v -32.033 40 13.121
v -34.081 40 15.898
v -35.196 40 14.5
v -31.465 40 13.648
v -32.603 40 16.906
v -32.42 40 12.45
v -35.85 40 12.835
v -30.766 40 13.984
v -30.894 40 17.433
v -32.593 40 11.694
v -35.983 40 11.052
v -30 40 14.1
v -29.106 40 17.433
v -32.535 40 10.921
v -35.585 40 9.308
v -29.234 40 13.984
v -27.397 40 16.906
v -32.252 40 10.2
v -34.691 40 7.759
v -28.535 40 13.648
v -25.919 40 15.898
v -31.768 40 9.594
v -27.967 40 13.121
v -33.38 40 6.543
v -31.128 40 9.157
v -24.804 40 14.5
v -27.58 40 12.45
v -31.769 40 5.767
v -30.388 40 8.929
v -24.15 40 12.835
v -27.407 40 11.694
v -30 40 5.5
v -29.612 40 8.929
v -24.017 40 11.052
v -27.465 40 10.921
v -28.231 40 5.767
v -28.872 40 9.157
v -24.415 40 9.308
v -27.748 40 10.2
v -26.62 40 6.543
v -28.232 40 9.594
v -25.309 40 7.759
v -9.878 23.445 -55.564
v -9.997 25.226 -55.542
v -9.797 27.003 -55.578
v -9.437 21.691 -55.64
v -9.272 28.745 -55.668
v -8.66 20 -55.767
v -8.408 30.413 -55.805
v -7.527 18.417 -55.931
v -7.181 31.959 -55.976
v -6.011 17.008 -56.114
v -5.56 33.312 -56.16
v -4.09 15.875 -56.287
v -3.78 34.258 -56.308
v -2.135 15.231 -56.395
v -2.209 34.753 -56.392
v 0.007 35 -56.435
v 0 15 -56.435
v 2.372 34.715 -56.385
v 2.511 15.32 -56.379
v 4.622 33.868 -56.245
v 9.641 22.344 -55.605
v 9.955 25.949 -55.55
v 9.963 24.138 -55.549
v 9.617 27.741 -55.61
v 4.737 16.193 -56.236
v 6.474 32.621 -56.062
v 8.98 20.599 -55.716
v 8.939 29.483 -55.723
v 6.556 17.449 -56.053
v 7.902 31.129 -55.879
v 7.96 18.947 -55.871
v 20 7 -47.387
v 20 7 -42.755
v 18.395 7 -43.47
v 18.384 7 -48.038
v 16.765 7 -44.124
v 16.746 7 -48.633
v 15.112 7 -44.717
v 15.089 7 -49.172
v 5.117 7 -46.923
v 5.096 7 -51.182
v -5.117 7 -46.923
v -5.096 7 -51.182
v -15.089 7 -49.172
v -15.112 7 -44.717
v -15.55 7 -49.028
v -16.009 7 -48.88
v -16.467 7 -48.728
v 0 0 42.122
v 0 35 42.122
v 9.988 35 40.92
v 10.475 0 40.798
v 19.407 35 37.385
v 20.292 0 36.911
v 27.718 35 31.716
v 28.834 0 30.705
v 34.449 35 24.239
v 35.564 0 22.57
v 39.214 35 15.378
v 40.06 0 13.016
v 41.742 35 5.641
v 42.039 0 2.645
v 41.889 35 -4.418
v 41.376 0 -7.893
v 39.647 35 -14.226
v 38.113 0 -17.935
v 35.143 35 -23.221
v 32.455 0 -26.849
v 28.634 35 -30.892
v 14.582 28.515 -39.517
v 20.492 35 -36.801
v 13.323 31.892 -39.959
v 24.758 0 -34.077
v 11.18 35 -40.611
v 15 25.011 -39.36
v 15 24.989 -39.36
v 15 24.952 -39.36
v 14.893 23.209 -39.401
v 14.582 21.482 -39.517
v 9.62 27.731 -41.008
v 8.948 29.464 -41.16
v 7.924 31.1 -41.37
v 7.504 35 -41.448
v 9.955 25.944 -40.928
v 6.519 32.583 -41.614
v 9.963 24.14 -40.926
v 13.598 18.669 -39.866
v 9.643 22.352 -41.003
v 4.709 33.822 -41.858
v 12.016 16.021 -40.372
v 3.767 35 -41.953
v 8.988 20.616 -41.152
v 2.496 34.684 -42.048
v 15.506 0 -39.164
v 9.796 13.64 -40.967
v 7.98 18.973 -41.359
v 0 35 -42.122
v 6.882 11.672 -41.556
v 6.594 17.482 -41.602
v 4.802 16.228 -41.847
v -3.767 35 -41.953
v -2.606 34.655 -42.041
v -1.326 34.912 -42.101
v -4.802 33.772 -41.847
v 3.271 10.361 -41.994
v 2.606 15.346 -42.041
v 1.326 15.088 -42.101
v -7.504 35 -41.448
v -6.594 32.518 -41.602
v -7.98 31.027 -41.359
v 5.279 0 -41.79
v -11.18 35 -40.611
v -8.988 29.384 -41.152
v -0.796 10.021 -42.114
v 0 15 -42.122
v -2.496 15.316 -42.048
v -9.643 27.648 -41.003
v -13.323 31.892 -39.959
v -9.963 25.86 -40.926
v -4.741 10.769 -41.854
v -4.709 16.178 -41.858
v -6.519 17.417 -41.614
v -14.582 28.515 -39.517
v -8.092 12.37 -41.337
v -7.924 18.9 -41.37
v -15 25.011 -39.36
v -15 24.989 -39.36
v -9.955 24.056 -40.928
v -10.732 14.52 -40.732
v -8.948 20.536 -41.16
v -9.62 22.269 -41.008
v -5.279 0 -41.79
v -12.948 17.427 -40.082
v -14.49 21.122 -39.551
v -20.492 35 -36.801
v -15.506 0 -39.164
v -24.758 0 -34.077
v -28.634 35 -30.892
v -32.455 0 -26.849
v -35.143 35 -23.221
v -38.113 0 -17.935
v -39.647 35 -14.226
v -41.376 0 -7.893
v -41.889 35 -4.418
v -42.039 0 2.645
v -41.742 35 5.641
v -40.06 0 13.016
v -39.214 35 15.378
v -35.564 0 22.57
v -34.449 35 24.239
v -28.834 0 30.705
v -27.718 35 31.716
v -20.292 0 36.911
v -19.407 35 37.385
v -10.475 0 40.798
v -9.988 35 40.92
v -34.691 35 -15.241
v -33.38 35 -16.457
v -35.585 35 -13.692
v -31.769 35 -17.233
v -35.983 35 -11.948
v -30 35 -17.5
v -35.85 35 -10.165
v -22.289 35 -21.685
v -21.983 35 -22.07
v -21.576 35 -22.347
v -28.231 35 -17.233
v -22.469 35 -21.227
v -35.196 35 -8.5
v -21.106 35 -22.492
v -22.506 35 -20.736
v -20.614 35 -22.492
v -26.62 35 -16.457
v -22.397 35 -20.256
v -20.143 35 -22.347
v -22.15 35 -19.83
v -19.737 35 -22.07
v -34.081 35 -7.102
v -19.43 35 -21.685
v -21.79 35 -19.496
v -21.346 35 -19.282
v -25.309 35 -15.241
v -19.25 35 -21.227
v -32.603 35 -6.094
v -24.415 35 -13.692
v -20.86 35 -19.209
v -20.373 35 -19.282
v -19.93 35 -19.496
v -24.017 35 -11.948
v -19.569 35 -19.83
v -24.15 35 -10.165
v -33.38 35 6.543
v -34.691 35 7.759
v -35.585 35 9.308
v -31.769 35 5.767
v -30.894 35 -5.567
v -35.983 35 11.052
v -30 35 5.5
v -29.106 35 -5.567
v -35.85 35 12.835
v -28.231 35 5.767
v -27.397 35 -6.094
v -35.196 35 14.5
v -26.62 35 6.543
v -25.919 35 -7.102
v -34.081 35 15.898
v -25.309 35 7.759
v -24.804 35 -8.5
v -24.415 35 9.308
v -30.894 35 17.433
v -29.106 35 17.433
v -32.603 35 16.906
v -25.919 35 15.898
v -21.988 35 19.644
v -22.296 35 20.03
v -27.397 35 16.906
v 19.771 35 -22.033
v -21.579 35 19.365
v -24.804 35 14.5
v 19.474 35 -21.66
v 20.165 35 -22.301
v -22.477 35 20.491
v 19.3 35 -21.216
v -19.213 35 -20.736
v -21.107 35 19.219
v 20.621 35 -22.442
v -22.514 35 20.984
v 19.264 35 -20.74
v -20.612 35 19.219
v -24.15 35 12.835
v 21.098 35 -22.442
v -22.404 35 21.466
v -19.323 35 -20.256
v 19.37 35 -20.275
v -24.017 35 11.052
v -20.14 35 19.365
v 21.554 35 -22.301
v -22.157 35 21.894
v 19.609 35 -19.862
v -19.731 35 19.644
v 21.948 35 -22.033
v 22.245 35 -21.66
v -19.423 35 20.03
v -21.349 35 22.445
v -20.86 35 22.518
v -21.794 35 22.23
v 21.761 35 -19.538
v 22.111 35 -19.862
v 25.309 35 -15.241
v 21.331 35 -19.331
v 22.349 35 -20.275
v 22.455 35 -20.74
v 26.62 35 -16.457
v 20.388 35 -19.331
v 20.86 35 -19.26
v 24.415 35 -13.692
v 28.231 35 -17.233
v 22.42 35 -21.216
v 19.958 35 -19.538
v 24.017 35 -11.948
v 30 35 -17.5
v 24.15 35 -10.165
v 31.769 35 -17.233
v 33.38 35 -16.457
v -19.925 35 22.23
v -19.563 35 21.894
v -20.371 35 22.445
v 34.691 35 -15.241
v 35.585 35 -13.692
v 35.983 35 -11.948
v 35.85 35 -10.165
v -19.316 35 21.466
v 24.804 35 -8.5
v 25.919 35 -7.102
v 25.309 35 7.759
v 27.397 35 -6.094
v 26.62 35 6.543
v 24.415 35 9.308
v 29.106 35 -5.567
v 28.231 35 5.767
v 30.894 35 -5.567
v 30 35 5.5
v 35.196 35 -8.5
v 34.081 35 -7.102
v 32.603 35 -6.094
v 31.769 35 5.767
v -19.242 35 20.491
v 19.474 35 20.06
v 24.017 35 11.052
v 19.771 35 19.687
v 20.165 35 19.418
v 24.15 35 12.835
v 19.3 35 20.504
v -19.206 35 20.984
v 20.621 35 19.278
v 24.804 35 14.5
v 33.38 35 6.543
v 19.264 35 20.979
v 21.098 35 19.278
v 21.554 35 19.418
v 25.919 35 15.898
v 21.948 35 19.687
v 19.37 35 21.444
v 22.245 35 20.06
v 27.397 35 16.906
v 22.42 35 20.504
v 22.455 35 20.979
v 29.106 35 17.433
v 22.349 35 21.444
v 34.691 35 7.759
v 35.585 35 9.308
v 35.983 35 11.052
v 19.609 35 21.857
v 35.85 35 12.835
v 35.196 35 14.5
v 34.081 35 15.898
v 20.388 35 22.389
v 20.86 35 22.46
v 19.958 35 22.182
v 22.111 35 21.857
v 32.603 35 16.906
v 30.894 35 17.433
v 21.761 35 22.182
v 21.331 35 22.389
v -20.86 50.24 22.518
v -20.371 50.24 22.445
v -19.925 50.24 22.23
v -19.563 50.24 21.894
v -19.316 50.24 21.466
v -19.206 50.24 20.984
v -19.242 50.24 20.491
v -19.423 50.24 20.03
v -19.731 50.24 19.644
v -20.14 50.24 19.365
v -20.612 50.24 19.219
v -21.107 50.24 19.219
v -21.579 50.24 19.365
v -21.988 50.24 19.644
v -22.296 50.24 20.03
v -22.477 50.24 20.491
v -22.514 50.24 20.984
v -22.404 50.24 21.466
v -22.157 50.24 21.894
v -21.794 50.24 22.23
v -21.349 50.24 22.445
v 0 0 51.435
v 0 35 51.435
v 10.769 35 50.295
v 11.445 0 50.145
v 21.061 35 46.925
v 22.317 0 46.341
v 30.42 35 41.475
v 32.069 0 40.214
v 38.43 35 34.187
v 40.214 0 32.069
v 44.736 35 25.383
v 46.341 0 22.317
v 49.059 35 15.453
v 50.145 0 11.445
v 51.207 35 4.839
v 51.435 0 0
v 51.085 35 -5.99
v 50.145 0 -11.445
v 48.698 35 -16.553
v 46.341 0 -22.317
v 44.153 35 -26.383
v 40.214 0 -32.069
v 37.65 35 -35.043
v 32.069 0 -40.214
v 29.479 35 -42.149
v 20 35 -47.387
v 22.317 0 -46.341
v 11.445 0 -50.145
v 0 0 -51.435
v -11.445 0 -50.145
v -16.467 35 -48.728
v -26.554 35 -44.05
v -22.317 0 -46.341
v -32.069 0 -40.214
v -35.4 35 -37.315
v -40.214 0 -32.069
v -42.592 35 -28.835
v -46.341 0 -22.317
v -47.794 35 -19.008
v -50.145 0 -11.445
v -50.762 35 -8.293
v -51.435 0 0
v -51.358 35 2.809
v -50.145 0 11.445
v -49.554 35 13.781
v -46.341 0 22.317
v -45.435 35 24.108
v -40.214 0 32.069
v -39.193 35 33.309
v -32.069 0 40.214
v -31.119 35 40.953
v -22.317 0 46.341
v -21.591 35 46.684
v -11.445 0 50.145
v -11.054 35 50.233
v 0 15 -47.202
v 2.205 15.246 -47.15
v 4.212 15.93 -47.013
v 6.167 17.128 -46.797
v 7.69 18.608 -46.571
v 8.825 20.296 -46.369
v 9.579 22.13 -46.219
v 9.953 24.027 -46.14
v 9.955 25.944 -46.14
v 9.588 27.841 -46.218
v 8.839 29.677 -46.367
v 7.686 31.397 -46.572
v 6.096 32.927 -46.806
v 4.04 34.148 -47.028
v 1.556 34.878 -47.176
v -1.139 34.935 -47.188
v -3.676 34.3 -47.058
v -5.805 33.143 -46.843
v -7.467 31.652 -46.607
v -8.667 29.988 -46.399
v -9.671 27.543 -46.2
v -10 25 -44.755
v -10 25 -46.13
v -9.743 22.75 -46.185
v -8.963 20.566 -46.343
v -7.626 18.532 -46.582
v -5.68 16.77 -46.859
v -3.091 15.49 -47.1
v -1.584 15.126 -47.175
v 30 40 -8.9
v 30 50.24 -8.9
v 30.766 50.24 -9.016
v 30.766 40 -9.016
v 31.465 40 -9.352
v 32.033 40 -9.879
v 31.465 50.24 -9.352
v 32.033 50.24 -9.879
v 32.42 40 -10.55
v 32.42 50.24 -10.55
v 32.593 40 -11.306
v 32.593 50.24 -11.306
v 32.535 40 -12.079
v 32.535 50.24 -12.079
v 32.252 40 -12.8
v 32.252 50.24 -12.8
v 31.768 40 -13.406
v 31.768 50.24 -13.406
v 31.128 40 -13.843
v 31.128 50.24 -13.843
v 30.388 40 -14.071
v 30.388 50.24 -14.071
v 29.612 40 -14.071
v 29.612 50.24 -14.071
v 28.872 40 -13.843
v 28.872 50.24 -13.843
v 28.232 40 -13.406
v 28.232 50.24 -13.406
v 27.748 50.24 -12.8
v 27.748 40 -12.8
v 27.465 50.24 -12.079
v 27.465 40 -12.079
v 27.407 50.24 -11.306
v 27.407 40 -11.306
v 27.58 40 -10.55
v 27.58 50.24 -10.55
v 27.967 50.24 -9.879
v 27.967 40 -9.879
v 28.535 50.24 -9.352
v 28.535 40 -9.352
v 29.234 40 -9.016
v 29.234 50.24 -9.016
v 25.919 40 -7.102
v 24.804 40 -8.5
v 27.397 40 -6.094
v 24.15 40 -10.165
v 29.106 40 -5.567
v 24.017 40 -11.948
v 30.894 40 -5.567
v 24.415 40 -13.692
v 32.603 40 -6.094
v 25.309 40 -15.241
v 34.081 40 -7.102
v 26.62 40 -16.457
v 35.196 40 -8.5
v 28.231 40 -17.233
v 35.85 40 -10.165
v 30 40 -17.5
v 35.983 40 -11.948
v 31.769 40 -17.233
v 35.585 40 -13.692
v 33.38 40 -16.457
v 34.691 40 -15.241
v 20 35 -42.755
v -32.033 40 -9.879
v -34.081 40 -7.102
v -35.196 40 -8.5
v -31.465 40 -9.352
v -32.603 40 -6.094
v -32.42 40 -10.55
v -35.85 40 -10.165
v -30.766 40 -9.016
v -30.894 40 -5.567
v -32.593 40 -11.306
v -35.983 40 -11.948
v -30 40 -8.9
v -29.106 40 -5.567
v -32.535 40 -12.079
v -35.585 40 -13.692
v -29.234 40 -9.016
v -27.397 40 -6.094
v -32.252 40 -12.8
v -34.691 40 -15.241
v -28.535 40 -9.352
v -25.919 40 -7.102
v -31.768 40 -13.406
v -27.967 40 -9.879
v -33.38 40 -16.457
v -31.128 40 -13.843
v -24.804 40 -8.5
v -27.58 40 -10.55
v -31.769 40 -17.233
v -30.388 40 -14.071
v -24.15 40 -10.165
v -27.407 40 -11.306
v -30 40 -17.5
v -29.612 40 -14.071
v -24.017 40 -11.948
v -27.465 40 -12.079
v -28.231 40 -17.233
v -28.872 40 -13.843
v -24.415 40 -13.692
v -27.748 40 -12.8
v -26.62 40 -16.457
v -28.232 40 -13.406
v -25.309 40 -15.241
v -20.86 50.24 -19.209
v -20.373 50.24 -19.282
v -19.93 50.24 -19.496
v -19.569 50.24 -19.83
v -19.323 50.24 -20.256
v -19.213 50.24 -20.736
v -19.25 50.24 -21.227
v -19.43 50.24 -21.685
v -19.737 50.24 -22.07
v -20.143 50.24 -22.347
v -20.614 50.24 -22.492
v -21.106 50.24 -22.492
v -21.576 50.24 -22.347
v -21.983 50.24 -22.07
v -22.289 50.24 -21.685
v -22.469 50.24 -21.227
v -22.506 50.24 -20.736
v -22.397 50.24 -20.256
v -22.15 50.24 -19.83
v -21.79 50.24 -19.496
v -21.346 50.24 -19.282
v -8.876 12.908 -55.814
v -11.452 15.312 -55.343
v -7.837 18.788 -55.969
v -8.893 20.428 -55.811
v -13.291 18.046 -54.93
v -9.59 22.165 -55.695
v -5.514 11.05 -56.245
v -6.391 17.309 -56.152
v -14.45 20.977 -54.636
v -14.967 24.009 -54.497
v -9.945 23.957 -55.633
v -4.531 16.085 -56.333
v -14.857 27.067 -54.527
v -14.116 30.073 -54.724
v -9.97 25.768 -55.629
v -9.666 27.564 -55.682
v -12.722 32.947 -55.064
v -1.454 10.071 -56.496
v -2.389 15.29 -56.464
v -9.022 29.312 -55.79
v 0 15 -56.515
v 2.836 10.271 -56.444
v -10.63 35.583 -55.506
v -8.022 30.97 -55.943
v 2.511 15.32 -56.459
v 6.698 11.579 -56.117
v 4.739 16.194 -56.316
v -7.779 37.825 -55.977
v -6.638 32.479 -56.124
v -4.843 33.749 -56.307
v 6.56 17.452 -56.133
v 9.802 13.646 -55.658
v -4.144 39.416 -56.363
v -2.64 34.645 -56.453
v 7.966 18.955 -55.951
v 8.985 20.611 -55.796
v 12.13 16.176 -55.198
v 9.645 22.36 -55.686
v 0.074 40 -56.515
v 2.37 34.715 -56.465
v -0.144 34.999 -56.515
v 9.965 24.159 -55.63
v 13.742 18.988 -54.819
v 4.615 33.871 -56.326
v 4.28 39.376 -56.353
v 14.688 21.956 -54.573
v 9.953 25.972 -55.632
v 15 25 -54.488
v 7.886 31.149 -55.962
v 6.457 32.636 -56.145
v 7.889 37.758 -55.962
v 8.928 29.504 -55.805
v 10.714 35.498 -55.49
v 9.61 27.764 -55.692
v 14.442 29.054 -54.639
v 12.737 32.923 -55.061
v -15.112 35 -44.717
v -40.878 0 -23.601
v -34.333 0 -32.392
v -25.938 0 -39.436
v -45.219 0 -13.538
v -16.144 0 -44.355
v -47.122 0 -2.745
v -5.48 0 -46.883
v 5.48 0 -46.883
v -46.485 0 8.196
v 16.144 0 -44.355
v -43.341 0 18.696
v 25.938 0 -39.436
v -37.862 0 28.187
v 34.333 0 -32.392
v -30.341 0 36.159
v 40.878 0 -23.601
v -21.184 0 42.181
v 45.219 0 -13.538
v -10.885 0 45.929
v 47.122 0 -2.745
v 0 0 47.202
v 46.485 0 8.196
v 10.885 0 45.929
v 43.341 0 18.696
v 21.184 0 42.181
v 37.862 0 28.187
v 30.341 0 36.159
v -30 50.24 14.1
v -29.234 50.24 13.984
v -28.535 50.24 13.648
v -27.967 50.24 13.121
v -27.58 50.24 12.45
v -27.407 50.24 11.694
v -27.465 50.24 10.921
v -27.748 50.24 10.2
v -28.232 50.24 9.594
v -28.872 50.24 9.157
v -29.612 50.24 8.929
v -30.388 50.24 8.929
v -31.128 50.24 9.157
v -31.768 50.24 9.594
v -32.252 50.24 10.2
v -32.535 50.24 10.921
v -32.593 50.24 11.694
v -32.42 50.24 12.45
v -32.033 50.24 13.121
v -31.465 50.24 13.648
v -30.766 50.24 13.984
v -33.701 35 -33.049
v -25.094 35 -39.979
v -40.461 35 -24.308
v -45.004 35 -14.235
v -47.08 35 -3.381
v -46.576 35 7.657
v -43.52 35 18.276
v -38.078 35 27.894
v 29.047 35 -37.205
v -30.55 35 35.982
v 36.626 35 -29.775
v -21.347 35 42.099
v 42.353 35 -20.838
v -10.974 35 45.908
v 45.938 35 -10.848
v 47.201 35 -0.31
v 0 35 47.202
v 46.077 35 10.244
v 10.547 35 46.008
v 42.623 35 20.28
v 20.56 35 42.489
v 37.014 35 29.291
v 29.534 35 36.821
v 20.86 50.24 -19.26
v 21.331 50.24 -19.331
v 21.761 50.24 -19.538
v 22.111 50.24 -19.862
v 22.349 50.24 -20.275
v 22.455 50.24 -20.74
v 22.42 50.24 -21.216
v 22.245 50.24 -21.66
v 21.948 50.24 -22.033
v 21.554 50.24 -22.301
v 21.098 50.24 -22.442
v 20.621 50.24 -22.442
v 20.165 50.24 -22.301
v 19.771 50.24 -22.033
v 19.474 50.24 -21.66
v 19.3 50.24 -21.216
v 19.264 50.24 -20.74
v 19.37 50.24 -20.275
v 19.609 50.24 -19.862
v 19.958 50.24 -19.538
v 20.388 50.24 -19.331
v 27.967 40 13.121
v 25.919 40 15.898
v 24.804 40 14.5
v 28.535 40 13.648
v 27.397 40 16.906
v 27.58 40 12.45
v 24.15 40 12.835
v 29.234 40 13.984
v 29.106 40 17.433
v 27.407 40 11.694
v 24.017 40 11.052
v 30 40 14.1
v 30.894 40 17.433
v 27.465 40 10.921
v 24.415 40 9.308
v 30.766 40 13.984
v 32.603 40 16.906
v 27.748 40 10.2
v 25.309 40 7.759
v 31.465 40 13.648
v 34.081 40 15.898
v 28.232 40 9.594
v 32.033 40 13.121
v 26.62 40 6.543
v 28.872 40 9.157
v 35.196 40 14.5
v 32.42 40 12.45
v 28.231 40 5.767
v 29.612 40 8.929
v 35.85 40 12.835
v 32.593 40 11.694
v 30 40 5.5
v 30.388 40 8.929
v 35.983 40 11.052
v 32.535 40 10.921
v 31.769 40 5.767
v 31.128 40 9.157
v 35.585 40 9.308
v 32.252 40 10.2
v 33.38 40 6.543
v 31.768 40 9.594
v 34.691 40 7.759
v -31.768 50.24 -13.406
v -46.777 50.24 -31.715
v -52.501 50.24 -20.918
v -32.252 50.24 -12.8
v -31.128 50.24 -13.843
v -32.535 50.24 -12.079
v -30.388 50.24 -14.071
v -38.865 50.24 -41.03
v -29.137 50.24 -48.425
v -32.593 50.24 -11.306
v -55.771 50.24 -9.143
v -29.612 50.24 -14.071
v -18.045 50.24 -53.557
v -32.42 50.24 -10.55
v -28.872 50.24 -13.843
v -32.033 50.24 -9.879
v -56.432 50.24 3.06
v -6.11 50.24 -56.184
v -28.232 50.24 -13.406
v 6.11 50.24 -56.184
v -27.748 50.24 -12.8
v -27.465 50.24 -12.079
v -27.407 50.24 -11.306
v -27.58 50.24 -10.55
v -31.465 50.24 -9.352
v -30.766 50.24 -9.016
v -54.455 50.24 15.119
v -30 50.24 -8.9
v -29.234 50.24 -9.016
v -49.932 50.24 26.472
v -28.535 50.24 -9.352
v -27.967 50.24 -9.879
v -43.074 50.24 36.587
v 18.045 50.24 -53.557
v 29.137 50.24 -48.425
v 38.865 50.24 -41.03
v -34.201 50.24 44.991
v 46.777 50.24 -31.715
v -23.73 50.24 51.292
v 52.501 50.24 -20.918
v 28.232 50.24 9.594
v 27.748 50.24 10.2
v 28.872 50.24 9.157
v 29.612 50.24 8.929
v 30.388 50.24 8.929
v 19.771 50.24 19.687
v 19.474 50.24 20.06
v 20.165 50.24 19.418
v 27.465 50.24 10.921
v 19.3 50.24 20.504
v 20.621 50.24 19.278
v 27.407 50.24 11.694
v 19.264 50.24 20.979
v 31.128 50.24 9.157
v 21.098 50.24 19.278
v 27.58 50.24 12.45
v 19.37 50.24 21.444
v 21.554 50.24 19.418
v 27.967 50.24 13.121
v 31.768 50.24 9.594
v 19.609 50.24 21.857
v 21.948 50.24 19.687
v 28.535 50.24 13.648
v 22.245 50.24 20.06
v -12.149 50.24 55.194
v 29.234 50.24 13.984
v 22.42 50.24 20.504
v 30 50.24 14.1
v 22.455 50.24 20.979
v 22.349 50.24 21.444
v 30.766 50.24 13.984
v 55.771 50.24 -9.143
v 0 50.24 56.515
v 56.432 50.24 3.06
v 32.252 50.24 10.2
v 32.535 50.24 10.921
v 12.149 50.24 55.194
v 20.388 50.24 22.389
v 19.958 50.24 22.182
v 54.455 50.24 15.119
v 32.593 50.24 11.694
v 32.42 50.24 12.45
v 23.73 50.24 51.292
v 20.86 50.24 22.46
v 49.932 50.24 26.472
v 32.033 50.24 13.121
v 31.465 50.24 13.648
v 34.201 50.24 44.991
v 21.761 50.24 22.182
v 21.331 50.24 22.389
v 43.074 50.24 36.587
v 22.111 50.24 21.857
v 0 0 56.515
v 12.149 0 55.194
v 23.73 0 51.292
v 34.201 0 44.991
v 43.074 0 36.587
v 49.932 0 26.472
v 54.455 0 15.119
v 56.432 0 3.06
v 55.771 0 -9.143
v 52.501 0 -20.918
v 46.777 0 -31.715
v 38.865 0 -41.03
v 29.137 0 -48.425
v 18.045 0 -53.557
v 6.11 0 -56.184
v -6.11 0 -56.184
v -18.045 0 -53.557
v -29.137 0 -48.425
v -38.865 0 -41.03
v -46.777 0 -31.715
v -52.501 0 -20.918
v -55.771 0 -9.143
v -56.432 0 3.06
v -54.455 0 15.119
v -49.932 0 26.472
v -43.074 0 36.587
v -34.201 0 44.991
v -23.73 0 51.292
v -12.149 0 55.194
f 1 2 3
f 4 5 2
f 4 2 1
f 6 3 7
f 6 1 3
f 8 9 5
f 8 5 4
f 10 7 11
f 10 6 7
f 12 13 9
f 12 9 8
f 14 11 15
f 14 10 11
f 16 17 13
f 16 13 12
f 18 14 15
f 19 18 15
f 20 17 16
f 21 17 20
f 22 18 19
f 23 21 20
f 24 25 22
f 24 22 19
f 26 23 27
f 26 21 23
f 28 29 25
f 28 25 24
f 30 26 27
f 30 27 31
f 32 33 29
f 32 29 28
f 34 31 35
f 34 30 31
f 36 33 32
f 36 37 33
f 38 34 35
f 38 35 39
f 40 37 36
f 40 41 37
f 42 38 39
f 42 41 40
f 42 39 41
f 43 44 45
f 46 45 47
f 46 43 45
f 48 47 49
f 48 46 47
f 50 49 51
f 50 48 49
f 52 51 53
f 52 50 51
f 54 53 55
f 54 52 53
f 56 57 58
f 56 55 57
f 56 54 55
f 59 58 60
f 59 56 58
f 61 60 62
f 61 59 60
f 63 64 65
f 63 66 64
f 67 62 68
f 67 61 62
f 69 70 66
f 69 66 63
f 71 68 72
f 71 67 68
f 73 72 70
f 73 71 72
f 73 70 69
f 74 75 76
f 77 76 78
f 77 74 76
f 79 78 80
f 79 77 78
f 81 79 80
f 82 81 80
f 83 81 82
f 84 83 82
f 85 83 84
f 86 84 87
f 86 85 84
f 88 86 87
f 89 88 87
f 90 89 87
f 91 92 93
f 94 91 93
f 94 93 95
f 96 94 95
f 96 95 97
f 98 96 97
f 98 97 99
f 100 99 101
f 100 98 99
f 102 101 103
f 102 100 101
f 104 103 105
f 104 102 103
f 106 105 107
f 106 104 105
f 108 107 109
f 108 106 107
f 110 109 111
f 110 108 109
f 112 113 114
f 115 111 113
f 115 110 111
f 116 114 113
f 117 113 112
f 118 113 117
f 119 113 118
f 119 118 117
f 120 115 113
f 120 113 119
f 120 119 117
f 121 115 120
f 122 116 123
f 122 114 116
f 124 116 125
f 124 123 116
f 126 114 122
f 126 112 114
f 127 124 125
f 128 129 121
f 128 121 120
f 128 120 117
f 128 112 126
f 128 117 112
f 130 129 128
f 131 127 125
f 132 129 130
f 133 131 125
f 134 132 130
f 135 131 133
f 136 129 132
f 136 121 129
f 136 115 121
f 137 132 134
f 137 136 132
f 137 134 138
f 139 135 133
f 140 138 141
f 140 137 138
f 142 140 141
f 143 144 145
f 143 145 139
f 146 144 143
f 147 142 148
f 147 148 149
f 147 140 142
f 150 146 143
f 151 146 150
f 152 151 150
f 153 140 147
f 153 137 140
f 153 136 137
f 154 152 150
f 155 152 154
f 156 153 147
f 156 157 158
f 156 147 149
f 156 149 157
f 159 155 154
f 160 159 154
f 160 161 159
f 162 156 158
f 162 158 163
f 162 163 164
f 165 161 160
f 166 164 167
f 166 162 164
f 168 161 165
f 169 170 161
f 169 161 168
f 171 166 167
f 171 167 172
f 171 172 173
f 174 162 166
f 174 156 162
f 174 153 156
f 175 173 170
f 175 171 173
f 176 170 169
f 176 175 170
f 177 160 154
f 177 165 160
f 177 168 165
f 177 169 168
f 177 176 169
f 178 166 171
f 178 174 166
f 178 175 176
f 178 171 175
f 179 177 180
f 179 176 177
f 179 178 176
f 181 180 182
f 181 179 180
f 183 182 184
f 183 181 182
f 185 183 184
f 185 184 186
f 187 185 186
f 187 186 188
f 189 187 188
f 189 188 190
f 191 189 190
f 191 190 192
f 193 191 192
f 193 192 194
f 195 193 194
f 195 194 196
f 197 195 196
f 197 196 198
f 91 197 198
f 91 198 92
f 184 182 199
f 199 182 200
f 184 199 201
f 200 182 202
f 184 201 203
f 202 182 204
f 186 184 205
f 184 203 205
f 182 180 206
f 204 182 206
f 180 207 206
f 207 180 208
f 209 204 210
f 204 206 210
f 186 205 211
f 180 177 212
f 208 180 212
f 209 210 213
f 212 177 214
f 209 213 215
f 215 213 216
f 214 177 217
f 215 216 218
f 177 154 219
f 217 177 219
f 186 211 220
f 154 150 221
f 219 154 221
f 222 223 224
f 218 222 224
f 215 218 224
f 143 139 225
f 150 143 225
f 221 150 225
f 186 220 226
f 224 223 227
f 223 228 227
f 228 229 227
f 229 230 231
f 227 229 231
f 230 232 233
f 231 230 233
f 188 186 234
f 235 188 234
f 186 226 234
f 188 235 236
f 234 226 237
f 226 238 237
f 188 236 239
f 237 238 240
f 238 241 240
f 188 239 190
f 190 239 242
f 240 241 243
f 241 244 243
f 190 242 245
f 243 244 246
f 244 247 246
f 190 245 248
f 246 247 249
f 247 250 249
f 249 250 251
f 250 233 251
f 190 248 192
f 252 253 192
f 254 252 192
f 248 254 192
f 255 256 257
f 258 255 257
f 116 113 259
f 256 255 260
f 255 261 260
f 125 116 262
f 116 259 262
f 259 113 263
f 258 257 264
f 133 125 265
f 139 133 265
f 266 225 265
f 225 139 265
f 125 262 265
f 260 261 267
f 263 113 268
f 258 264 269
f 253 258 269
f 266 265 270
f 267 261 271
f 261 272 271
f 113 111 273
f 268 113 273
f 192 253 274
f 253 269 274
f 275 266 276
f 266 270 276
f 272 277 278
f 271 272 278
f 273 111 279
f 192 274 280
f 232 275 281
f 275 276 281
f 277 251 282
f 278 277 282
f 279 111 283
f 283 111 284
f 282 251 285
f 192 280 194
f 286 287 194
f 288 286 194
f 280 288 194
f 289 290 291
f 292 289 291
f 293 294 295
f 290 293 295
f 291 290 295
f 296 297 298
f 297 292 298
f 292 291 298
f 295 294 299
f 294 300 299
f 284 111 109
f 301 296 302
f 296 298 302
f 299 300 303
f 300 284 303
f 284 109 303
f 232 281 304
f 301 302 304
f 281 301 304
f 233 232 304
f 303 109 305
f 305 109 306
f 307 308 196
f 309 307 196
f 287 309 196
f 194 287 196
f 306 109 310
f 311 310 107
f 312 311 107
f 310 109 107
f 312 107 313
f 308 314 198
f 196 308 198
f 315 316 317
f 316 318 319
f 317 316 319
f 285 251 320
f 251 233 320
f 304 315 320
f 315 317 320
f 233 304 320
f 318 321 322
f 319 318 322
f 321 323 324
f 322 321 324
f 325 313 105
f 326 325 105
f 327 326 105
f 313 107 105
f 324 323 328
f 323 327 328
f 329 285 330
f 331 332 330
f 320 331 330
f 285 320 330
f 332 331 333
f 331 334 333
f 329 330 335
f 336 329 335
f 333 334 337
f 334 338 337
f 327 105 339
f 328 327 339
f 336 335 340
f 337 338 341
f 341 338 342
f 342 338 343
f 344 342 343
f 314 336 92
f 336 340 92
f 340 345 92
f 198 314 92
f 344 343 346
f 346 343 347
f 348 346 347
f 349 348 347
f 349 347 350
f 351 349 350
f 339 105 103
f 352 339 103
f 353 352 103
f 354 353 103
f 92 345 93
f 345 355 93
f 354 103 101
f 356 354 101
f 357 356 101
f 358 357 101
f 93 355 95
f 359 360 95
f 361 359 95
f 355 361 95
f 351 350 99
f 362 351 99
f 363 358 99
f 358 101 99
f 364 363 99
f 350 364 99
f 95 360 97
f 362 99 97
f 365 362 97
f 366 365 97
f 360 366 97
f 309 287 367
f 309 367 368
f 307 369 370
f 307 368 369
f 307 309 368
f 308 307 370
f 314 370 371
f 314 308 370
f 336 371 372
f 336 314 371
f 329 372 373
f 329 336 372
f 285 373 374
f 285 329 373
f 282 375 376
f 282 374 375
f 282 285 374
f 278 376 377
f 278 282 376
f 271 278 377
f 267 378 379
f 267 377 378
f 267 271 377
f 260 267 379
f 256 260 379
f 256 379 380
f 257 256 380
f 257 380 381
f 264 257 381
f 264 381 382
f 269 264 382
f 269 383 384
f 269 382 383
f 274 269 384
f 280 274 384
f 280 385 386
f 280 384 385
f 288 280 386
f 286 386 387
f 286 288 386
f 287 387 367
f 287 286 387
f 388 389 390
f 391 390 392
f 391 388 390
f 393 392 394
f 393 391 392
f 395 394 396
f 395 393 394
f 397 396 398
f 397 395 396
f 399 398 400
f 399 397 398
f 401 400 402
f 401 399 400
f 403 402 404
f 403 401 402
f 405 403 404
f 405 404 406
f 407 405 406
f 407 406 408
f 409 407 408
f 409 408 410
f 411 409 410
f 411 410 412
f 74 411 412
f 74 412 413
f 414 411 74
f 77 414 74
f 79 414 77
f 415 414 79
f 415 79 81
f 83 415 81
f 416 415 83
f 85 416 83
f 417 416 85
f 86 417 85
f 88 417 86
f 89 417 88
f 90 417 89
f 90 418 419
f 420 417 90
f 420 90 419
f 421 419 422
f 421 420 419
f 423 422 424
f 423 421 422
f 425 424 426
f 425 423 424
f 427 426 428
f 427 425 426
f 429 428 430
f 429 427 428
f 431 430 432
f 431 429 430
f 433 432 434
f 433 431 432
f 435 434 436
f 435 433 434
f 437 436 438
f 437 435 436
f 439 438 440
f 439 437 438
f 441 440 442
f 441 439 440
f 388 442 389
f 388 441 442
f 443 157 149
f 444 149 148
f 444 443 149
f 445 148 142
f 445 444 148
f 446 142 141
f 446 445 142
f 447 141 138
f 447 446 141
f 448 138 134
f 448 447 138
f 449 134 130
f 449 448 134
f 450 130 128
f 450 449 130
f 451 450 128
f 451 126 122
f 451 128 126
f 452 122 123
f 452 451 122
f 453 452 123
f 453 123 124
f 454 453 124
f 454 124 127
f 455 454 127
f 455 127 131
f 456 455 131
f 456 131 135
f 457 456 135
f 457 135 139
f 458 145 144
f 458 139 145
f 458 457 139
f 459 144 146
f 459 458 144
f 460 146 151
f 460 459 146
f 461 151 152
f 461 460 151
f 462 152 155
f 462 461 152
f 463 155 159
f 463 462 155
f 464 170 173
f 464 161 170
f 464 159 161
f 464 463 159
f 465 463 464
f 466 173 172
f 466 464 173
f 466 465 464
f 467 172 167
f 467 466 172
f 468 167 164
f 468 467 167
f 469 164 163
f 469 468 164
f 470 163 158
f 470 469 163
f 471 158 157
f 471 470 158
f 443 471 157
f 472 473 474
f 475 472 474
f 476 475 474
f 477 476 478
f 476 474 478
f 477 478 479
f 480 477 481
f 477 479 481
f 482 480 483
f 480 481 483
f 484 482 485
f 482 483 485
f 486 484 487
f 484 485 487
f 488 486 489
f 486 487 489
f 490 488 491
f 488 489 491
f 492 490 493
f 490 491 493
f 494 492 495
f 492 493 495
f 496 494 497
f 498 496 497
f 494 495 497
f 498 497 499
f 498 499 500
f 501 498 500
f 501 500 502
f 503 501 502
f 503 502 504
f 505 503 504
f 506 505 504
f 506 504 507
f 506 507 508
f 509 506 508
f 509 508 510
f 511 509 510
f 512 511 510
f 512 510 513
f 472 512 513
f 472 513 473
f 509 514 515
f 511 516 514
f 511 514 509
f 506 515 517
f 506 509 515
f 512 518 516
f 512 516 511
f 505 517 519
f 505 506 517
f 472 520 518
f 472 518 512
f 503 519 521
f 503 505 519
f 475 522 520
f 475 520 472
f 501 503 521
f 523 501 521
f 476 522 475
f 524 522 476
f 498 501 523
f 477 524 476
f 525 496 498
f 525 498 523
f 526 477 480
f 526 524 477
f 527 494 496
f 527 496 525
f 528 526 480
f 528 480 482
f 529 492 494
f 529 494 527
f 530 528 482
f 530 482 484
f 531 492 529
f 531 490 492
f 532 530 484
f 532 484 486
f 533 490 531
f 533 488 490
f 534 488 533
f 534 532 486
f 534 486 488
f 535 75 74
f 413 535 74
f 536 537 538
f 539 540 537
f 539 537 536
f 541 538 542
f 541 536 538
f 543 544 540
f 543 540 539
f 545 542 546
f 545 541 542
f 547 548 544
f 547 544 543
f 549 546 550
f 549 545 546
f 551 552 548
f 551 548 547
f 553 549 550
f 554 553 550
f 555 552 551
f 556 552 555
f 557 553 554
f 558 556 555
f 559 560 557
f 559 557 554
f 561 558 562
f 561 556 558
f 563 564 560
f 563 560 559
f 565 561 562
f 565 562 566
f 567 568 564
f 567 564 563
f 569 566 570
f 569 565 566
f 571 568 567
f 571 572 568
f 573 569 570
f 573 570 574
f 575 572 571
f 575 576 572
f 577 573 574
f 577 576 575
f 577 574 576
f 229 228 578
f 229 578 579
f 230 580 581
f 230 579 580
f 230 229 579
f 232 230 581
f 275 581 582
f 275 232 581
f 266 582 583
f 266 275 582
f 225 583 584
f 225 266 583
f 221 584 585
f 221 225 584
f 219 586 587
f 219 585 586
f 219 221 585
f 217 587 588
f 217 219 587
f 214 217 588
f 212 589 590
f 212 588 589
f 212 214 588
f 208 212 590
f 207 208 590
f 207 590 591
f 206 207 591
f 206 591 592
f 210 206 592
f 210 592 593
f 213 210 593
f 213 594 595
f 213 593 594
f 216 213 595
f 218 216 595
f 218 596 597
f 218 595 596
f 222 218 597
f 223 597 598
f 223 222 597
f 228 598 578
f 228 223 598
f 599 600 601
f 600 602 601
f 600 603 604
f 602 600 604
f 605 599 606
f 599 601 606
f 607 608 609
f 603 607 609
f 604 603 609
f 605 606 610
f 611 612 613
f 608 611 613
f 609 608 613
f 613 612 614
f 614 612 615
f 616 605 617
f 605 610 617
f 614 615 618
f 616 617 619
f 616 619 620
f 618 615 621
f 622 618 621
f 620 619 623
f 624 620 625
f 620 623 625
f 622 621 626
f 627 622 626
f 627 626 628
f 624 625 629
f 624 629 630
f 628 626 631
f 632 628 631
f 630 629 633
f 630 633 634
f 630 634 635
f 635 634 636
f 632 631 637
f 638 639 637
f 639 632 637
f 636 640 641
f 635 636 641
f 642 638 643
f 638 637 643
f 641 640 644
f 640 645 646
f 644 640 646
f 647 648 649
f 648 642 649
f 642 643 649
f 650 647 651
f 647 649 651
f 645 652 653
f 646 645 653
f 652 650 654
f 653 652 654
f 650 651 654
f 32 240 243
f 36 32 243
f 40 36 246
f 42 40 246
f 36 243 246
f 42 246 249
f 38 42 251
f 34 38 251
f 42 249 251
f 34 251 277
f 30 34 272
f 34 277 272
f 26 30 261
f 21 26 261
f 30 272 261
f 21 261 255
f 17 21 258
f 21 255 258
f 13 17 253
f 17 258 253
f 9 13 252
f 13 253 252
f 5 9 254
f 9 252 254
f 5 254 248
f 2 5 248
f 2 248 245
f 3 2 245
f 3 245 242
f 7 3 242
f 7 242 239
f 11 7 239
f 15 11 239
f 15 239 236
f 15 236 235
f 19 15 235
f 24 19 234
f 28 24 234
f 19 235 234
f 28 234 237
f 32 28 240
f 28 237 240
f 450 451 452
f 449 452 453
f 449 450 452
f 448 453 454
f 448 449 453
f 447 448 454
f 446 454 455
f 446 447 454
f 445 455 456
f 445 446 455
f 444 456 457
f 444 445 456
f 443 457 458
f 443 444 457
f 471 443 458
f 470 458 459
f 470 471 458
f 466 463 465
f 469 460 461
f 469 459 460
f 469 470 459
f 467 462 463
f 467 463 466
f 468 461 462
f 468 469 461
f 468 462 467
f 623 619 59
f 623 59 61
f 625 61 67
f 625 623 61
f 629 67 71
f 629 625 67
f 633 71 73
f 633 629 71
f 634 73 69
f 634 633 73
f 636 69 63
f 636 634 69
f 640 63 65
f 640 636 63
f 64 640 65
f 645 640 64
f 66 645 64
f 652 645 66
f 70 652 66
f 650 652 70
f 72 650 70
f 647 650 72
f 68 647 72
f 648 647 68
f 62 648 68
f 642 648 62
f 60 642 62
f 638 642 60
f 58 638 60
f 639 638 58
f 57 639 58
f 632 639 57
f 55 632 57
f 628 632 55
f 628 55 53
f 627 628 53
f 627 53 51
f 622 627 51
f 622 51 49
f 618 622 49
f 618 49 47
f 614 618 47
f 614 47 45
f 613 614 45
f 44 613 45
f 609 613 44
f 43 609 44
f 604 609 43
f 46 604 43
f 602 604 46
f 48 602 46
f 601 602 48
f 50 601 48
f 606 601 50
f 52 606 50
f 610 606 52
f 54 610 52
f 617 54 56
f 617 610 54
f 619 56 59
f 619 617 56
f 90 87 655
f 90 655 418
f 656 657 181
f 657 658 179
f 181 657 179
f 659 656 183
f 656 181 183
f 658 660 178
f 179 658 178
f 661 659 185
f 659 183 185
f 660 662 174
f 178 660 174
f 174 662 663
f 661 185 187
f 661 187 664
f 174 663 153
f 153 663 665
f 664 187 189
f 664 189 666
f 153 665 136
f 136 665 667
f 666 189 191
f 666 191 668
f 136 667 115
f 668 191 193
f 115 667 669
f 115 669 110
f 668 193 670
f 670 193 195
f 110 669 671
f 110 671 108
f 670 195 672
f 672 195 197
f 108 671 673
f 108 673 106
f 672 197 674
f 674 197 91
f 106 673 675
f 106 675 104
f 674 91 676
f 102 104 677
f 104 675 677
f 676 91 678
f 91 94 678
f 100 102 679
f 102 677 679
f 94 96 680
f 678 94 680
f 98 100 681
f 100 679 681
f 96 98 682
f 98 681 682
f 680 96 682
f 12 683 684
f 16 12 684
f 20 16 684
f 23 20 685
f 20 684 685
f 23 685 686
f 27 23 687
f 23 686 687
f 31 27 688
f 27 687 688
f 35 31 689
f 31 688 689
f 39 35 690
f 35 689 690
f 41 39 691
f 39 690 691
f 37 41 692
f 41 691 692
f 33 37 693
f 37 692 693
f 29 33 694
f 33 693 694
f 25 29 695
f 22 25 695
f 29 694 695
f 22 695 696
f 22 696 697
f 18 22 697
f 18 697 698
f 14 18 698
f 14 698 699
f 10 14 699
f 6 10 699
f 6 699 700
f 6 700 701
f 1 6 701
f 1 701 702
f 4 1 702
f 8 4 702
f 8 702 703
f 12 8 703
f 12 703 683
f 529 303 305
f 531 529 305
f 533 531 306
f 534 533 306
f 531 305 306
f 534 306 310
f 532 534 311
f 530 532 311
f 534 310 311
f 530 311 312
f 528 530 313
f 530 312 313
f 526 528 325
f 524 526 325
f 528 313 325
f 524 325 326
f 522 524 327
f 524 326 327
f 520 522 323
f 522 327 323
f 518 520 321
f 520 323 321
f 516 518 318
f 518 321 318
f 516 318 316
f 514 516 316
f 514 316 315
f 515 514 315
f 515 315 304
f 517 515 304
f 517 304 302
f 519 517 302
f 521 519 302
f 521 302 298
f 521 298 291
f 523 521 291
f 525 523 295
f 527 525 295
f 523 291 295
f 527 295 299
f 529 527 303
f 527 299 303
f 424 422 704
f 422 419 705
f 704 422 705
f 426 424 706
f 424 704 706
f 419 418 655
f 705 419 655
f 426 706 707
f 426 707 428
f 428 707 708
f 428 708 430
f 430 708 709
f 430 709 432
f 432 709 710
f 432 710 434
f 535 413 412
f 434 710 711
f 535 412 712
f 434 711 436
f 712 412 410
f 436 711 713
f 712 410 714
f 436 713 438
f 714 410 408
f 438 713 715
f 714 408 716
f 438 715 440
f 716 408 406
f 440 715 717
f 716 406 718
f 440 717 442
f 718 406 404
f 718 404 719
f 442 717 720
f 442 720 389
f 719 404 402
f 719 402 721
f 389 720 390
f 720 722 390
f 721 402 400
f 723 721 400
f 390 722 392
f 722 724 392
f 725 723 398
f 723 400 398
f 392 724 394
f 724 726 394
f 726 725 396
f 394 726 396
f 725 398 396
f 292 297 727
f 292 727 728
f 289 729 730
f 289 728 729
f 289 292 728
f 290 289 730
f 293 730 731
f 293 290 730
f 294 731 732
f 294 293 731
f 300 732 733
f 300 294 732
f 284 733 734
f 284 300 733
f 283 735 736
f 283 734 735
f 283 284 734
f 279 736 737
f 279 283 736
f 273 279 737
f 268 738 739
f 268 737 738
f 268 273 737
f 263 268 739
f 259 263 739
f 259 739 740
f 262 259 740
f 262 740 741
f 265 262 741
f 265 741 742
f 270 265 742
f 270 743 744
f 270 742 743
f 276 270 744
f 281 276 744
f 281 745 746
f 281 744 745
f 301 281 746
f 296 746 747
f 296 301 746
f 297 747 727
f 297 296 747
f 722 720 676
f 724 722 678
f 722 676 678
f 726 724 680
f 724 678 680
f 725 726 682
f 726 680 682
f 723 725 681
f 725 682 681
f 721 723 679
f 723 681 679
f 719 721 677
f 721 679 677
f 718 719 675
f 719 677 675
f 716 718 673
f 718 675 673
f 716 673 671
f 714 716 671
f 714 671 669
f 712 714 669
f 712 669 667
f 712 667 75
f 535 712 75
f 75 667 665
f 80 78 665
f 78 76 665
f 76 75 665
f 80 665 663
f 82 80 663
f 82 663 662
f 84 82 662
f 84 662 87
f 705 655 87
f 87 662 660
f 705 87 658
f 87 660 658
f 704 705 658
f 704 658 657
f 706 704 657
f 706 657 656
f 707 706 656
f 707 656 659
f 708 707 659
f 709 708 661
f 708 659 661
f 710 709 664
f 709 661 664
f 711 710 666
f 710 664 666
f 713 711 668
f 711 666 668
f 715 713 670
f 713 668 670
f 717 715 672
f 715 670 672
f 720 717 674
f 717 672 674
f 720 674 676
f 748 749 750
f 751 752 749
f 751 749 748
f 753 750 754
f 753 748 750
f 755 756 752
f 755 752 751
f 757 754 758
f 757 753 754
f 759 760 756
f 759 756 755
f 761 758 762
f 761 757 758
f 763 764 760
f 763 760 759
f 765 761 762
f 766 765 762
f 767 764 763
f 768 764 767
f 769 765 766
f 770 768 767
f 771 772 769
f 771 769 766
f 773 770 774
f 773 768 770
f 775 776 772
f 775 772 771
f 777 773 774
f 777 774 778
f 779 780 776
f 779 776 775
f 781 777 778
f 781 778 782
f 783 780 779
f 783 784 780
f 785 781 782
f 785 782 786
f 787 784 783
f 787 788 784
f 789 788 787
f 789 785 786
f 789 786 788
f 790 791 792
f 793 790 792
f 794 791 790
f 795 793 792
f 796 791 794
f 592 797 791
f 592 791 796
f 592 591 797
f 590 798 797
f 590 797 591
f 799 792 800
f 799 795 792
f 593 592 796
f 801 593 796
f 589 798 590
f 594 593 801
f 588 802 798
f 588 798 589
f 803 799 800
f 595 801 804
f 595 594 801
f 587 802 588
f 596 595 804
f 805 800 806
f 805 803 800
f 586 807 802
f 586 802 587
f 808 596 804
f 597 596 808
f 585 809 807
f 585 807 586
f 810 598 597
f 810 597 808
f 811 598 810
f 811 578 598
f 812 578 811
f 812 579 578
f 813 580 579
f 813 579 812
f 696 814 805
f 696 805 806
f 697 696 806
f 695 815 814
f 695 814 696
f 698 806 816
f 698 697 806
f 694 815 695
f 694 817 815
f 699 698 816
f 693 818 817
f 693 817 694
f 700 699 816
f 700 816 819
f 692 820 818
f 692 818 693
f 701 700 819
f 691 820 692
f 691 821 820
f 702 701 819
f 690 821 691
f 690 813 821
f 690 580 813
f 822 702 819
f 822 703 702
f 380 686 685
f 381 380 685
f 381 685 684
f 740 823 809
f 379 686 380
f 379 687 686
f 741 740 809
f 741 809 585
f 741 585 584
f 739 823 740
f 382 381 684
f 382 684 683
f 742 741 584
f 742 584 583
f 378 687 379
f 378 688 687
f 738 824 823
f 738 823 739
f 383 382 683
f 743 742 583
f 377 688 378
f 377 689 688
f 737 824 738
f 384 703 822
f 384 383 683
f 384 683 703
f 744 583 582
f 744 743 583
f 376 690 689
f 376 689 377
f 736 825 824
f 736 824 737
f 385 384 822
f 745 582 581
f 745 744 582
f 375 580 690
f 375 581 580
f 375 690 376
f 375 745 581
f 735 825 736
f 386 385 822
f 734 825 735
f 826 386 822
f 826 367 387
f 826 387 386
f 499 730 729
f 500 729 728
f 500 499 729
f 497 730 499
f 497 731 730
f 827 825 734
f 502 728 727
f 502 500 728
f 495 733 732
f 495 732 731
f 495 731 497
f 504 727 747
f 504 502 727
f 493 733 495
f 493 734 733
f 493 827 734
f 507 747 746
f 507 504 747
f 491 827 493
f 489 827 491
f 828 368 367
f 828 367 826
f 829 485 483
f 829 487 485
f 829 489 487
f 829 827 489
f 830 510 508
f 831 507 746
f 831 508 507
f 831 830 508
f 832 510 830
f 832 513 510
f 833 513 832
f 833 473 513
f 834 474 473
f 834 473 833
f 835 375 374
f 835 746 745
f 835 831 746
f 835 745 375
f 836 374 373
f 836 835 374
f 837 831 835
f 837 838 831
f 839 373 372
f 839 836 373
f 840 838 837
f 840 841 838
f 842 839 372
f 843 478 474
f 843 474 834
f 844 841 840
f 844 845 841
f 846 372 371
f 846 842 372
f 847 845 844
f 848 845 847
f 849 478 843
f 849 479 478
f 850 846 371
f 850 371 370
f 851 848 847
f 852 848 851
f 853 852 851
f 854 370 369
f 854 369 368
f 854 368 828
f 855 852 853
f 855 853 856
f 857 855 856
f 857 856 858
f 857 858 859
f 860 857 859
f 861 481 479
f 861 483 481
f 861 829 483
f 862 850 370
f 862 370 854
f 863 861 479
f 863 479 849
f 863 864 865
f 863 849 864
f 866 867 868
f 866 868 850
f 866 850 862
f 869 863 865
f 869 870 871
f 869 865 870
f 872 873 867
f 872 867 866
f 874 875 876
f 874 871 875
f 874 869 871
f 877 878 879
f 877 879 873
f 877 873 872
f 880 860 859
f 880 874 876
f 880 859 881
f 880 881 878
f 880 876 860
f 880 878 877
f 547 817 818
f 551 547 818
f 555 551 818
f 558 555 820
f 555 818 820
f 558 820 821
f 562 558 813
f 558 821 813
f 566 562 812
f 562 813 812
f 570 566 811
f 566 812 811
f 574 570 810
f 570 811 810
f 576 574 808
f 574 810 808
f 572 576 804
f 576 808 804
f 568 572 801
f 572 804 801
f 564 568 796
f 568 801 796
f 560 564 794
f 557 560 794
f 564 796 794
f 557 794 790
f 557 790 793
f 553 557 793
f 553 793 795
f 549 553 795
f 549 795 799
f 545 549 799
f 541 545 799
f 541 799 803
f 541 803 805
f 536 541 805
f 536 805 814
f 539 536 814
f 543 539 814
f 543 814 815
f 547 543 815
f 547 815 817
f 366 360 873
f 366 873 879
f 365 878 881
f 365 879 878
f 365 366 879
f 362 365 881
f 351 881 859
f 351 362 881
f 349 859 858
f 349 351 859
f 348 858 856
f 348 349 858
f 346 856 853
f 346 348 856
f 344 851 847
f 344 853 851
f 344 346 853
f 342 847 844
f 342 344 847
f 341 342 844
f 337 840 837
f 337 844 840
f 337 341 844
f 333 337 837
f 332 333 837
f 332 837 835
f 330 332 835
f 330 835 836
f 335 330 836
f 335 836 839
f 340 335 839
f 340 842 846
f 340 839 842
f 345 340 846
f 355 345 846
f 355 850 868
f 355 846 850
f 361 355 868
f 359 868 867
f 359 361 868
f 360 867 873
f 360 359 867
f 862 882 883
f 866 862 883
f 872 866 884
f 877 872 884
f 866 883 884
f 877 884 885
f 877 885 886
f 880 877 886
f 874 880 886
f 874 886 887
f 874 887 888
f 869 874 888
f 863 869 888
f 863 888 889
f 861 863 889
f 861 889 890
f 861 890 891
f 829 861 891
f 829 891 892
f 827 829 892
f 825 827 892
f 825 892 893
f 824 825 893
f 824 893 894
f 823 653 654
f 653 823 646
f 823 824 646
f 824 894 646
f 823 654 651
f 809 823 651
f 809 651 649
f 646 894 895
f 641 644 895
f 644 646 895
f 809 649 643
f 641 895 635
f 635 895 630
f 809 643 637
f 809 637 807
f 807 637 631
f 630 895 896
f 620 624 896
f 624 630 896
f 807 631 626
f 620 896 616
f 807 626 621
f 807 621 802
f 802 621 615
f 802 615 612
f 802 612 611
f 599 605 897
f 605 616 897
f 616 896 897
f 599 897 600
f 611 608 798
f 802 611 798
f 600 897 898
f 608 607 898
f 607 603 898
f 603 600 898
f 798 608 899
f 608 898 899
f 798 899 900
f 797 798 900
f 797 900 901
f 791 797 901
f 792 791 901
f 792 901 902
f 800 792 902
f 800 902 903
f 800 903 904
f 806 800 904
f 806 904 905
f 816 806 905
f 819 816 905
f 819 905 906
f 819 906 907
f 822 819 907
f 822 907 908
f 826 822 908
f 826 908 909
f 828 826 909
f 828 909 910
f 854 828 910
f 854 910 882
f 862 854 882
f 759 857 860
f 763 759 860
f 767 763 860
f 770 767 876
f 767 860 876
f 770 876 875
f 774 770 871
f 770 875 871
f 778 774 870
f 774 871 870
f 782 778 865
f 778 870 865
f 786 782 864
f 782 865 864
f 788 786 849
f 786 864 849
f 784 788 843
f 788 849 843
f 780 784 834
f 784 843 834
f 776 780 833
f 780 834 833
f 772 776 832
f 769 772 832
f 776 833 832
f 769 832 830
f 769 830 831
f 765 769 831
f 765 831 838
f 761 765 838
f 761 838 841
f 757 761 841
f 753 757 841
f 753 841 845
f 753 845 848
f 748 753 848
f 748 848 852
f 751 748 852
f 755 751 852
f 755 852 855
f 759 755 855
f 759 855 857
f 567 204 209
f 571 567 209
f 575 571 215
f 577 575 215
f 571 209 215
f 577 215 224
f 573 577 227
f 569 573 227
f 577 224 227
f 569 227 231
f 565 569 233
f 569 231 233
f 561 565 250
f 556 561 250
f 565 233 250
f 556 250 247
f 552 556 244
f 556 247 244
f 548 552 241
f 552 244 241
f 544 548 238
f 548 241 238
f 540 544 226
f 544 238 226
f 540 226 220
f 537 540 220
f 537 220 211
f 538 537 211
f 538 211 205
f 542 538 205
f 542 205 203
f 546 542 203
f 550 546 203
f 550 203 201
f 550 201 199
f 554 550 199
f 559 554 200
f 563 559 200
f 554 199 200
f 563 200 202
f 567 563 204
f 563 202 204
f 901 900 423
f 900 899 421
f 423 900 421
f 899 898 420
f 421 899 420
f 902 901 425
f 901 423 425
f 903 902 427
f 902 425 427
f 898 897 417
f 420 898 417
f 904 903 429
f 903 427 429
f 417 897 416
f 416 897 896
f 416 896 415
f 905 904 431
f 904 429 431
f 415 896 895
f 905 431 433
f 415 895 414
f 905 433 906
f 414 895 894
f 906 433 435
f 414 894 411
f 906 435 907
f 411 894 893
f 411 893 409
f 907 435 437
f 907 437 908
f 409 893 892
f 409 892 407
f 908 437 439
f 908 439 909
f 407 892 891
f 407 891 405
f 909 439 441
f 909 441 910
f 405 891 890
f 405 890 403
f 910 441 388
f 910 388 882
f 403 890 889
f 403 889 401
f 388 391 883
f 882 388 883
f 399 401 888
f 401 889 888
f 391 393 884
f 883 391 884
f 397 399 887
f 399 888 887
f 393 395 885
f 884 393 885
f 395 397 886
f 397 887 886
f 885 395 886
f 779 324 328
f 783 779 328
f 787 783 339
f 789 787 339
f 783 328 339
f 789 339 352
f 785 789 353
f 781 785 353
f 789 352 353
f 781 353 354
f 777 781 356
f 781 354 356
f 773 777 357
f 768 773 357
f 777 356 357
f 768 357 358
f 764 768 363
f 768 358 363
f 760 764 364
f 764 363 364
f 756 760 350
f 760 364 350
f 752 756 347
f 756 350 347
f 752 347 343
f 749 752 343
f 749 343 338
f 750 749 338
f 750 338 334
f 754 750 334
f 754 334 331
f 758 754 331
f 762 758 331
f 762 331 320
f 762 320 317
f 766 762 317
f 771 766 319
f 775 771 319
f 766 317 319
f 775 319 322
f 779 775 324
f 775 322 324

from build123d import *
from build123d.topology import SkipClean

# Parameters (mm, degrees)
SKETCH2_R                = 56.515
SKETCH2_R_2              = 51.435
BOSS_EXTRUDE1_DEPTH      = 35
SKETCH2_R_3              = 47.201666667
SKETCH2_R_4              = 42.121666667
BOSS_EXTRUDE1_2_DEPTH    = 35
SKETCH3_R                = 56.515
BOSS_EXTRUDE2_DEPTH      = 15.24
CUT_EXTRUDE1_DEPTH       = 95.40311462
CUT_EXTRUDE1_DEPTH_BACK  = 95.40311462
SKETCH4_R                = 1.6
SKETCH4_R_2              = 1.65876763
SKETCH4_R_3              = 1.651
CUT_EXTRUDE18_REACH      = 96.403
SKETCH32_R               = 2.6
SKETCH_1_R               = 6
CUT_EXTRUDE_1_DEPTH      = 5
CUT_EXTRUDE_2_REACH      = 137.992
CUT_EXTRUDE_2_END_RADIUS = 42.121666667
SKETCH_3_R               = 10
SKETCH_4_R               = 15
SKETCH_4_R_2             = 10
EXTRUDE_1_DEPTH          = 17.154678362
SKETCH_10_W              = 5
SKETCH_10_H              = 4.233333333
SKETCH_10_H_2            = 4.444320869
EXTRUDE_3_DEPTH          = 33
CUT_EXTRUDE_START        = -40
SKETCH_11_R              = 61.515
SKETCH_11_R_2            = 56.515
CUT_EXTRUDE_3_DEPTH      = 30
SKETCH_15_W              = 2.458765136
SKETCH_15_H              = 28
EXTRUDE_9_DEPTH          = 5


with BuildPart() as part:
    # Sketch2 → Boss-Extrude1 (new body)
    with BuildSketch(Plane(origin=(0, 0, 0), x_dir=(1, 0, 0), z_dir=(0, 1, 0))):
        with Locations(Location((0, 0, 0), (0, 0, 270))):
            Circle(SKETCH2_R)
        with Locations(Location((0, 0, 0), (0, 0, 270))):
            Circle(SKETCH2_R_2, mode=Mode.SUBTRACT)
    extrude(amount=BOSS_EXTRUDE1_DEPTH)



with BuildPart() as body_2:
    # Sketch2 → Boss-Extrude1 2 (new body)
    with BuildSketch(Plane(origin=(0, 0, 0), x_dir=(1, 0, 0), z_dir=(0, 1, 0))):
        with Locations(Location((0, 0, 0), (0, 0, 270))):
            Circle(SKETCH2_R_3)
        with Locations(Location((0, 0, 0), (0, 0, 270))):
            Circle(SKETCH2_R_4, mode=Mode.SUBTRACT)
    extrude(amount=BOSS_EXTRUDE1_2_DEPTH)


with BuildPart() as part_1:
    add(part.part)

    add(body_2.part)  # Boss-Extrude2 merges body 2
    # Sketch3 → Boss-Extrude2 (add)
    with BuildSketch(Plane(origin=(0, 35, 0), x_dir=(1, 0, 0), z_dir=(0, 1, 0))):
        with Locations(Location((0, 0, 0), (0, 0, 270))):
            Circle(SKETCH3_R)
    extrude(amount=BOSS_EXTRUDE2_DEPTH)

    # Sketch4 → Cut-Extrude1 (cut, two sides: drawn at the far end of the back side and taken through both)
    with BuildSketch(Plane(origin=(0, 50.24, 0), x_dir=(1, 0, 0), z_dir=(0, 1, 0)).offset(-CUT_EXTRUDE1_DEPTH_BACK)):
        with Locations(Location((20.859650045, 20.859650045, 0), (0, 0, 270))):
            Circle(SKETCH4_R)
        with Locations(Location((20.859650045, -20.859650045, 0), (0, 0, 270))):
            Circle(SKETCH4_R)
        with Locations(Location((-20.859650045, -20.859650045, 0), (0, 0, 270))):
            Circle(SKETCH4_R_2)
        with Locations(Location((-20.859650045, 20.859650045, 0), (0, 0, 270))):
            Circle(SKETCH4_R_3)
    extrude(amount=CUT_EXTRUDE1_DEPTH + CUT_EXTRUDE1_DEPTH_BACK, mode=Mode.SUBTRACT)

    # Sketch32 → Cut-Extrude18 (cut, up to next)
    with BuildSketch(Plane(origin=(0, 50.24, 0), x_dir=(1, 0, 0), z_dir=(0, 1, 0)), mode=Mode.PRIVATE) as cut_extrude18_sk1:
        with Locations(Location((30, 11.5, 0), (0, 0, 270))):
            Circle(SKETCH32_R)
    cut_extrude18_tool1 = extrude(cut_extrude18_sk1.sketch, amount=-CUT_EXTRUDE18_REACH, mode=Mode.PRIVATE) & part_1.part
    # Sketch32 → Cut-Extrude18 (cut, up to next)
    with BuildSketch(Plane(origin=(0, 50.24, 0), x_dir=(1, 0, 0), z_dir=(0, 1, 0)), mode=Mode.PRIVATE) as cut_extrude18_sk2:
        with Locations(Location((30, -11.5, 0), (0, 0, 270))):
            Circle(SKETCH32_R)
    cut_extrude18_tool2 = extrude(cut_extrude18_sk2.sketch, amount=-CUT_EXTRUDE18_REACH, mode=Mode.PRIVATE) & part_1.part
    # Sketch32 → Cut-Extrude18 (cut, up to next)
    with BuildSketch(Plane(origin=(0, 50.24, 0), x_dir=(1, 0, 0), z_dir=(0, 1, 0)), mode=Mode.PRIVATE) as cut_extrude18_sk3:
        with Locations(Location((-30, -11.5, 0), (0, 0, 270))):
            Circle(SKETCH32_R)
    cut_extrude18_tool3 = extrude(cut_extrude18_sk3.sketch, amount=-CUT_EXTRUDE18_REACH, mode=Mode.PRIVATE) & part_1.part
    # Sketch32 → Cut-Extrude18 (cut, up to next)
    with BuildSketch(Plane(origin=(0, 50.24, 0), x_dir=(1, 0, 0), z_dir=(0, 1, 0)), mode=Mode.PRIVATE) as cut_extrude18_sk4:
        with Locations(Location((-30, 11.5, 0), (0, 0, 270))):
            Circle(SKETCH32_R)
    cut_extrude18_tool4 = extrude(cut_extrude18_sk4.sketch, amount=-CUT_EXTRUDE18_REACH, mode=Mode.PRIVATE) & part_1.part
    add(cut_extrude18_tool1.solids().sort_by_distance((30, 50.24, -11.5))[0], mode=Mode.SUBTRACT)
    add(cut_extrude18_tool2.solids().sort_by_distance((30, 50.24, 11.5))[0], mode=Mode.SUBTRACT)
    add(cut_extrude18_tool3.solids().sort_by_distance((-30, 50.24, 11.5))[0], mode=Mode.SUBTRACT)
    add(cut_extrude18_tool4.solids().sort_by_distance((-30, 50.24, -11.5))[0], mode=Mode.SUBTRACT)

    # 草图1 → 切除-拉伸1 (cut)
    with BuildSketch(Plane(origin=(0, 35, 0), x_dir=(-1, 0, 0), z_dir=(0, -1, 0))):
        with Locations(Location((30, 11.5, 0), (0, 0, 90))):
            Circle(SKETCH_1_R)
        with Locations(Location((30, -11.5, 0), (0, 0, 90))):
            Circle(SKETCH_1_R)
        with Locations(Location((-30, 11.5, 0), (0, 0, 90))):
            Circle(SKETCH_1_R)
        with Locations(Location((-30, -11.5, 0), (0, 0, 90))):
            Circle(SKETCH_1_R)
    extrude(amount=-CUT_EXTRUDE_1_DEPTH, mode=Mode.SUBTRACT)

    # 切除-拉伸2: up to this cylinder (the profile starts outside it)
    cut_extrude_2_end = Plane(origin=(0, 25, 0), z_dir=(0, -1, 0)) * Cylinder(CUT_EXTRUDE_2_END_RADIUS, 361.227333333, mode=Mode.PRIVATE)
    # 草图3 → 切除-拉伸2 (cut, up to the surface)
    with BuildSketch(Plane.XY.offset(-56.515), mode=Mode.PRIVATE) as cut_extrude_2_sk1:
        with Locations(Location((0, 25, 0), (0, 0, 270))):
            Circle(SKETCH_3_R)
    cut_extrude_2_tool1 = extrude(cut_extrude_2_sk1.sketch, amount=CUT_EXTRUDE_2_REACH, mode=Mode.PRIVATE) - cut_extrude_2_end
    add(cut_extrude_2_tool1.solids().sort_by_distance((0, 25, -56.515))[0], mode=Mode.SUBTRACT)

    # 草图4 → 拉伸-薄壁1 (add)
    with SkipClean():  # the faces are left unmerged after this step: merging them gives an invalid solid
        with BuildSketch(Plane.XY.offset(-56.515)):
            with Locations((0, 25)):
                Circle(SKETCH_4_R)
            with Locations((0, 25)):
                Circle(SKETCH_4_R_2, mode=Mode.SUBTRACT)
        extrude(amount=EXTRUDE_1_DEPTH)

    # 草图10 → 拉伸-薄壁3 (add)
    with SkipClean():  # the faces are left unmerged after this step: merging them gives an invalid solid
        with BuildSketch(Plane(origin=(0, 7, 0), x_dir=(1, 0, 0), z_dir=(0, 1, 0))):
            with Locations((2.5, 49.318333334)):
                Rectangle(SKETCH_10_W, SKETCH_10_H)
            with Locations((-12.5, 46.977018675)):
                Rectangle(SKETCH_10_W, SKETCH_10_H_2)
            with Locations((17.5, 46.977018675)):
                Rectangle(SKETCH_10_W, SKETCH_10_H_2)
            with BuildLine():
                ThreePointArc((15.089267159, 49.171874498), (0, 51.435), (-15.089267159, 49.171874498))
                Line((-15.089267159, 49.171874498), (-16.55609589, 53.951875907))
                ThreePointArc((-16.55609589, 53.951875907), (0, 56.435), (16.55609589, 53.951875907))
                Line((16.55609589, 53.951875907), (15.089267159, 49.171874498))
            make_face()
            with BuildLine():
                ThreePointArc((15.111664358, 44.717277829), (0, 47.201666667), (-15.111664358, 44.717277829))
                Line((-15.111664358, 44.717277829), (-16.712419736, 49.454110338))
                ThreePointArc((-16.712419736, 49.454110338), (0, 52.201666667), (16.712419736, 49.454110338))
                Line((16.712419736, 49.454110338), (15.111664358, 44.717277829))
            make_face()
        extrude(amount=EXTRUDE_3_DEPTH)

    # 草图11 → 切除-拉伸-薄壁3 (cut)
    with SkipClean():  # the faces are left unmerged after this step: merging them gives an invalid solid
        with BuildSketch(Plane(origin=(0, 0, 0), x_dir=(-1, 0, 0), z_dir=(0, -1, 0)).offset(CUT_EXTRUDE_START)):
            Circle(SKETCH_11_R)
            Circle(SKETCH_11_R_2, mode=Mode.SUBTRACT)
        extrude(amount=CUT_EXTRUDE_3_DEPTH, mode=Mode.SUBTRACT)

    # 草图15 → 凸台-拉伸9 (add)
    with BuildSketch(Plane(origin=(20, 0, 0), x_dir=(0, 0, -1), z_dir=(1, 0, 0))):
        with Locations((43.525475672, 21)):
            Rectangle(SKETCH_15_W, SKETCH_15_H)
    extrude(amount=-EXTRUDE_9_DEPTH)


solid = part_1.part
